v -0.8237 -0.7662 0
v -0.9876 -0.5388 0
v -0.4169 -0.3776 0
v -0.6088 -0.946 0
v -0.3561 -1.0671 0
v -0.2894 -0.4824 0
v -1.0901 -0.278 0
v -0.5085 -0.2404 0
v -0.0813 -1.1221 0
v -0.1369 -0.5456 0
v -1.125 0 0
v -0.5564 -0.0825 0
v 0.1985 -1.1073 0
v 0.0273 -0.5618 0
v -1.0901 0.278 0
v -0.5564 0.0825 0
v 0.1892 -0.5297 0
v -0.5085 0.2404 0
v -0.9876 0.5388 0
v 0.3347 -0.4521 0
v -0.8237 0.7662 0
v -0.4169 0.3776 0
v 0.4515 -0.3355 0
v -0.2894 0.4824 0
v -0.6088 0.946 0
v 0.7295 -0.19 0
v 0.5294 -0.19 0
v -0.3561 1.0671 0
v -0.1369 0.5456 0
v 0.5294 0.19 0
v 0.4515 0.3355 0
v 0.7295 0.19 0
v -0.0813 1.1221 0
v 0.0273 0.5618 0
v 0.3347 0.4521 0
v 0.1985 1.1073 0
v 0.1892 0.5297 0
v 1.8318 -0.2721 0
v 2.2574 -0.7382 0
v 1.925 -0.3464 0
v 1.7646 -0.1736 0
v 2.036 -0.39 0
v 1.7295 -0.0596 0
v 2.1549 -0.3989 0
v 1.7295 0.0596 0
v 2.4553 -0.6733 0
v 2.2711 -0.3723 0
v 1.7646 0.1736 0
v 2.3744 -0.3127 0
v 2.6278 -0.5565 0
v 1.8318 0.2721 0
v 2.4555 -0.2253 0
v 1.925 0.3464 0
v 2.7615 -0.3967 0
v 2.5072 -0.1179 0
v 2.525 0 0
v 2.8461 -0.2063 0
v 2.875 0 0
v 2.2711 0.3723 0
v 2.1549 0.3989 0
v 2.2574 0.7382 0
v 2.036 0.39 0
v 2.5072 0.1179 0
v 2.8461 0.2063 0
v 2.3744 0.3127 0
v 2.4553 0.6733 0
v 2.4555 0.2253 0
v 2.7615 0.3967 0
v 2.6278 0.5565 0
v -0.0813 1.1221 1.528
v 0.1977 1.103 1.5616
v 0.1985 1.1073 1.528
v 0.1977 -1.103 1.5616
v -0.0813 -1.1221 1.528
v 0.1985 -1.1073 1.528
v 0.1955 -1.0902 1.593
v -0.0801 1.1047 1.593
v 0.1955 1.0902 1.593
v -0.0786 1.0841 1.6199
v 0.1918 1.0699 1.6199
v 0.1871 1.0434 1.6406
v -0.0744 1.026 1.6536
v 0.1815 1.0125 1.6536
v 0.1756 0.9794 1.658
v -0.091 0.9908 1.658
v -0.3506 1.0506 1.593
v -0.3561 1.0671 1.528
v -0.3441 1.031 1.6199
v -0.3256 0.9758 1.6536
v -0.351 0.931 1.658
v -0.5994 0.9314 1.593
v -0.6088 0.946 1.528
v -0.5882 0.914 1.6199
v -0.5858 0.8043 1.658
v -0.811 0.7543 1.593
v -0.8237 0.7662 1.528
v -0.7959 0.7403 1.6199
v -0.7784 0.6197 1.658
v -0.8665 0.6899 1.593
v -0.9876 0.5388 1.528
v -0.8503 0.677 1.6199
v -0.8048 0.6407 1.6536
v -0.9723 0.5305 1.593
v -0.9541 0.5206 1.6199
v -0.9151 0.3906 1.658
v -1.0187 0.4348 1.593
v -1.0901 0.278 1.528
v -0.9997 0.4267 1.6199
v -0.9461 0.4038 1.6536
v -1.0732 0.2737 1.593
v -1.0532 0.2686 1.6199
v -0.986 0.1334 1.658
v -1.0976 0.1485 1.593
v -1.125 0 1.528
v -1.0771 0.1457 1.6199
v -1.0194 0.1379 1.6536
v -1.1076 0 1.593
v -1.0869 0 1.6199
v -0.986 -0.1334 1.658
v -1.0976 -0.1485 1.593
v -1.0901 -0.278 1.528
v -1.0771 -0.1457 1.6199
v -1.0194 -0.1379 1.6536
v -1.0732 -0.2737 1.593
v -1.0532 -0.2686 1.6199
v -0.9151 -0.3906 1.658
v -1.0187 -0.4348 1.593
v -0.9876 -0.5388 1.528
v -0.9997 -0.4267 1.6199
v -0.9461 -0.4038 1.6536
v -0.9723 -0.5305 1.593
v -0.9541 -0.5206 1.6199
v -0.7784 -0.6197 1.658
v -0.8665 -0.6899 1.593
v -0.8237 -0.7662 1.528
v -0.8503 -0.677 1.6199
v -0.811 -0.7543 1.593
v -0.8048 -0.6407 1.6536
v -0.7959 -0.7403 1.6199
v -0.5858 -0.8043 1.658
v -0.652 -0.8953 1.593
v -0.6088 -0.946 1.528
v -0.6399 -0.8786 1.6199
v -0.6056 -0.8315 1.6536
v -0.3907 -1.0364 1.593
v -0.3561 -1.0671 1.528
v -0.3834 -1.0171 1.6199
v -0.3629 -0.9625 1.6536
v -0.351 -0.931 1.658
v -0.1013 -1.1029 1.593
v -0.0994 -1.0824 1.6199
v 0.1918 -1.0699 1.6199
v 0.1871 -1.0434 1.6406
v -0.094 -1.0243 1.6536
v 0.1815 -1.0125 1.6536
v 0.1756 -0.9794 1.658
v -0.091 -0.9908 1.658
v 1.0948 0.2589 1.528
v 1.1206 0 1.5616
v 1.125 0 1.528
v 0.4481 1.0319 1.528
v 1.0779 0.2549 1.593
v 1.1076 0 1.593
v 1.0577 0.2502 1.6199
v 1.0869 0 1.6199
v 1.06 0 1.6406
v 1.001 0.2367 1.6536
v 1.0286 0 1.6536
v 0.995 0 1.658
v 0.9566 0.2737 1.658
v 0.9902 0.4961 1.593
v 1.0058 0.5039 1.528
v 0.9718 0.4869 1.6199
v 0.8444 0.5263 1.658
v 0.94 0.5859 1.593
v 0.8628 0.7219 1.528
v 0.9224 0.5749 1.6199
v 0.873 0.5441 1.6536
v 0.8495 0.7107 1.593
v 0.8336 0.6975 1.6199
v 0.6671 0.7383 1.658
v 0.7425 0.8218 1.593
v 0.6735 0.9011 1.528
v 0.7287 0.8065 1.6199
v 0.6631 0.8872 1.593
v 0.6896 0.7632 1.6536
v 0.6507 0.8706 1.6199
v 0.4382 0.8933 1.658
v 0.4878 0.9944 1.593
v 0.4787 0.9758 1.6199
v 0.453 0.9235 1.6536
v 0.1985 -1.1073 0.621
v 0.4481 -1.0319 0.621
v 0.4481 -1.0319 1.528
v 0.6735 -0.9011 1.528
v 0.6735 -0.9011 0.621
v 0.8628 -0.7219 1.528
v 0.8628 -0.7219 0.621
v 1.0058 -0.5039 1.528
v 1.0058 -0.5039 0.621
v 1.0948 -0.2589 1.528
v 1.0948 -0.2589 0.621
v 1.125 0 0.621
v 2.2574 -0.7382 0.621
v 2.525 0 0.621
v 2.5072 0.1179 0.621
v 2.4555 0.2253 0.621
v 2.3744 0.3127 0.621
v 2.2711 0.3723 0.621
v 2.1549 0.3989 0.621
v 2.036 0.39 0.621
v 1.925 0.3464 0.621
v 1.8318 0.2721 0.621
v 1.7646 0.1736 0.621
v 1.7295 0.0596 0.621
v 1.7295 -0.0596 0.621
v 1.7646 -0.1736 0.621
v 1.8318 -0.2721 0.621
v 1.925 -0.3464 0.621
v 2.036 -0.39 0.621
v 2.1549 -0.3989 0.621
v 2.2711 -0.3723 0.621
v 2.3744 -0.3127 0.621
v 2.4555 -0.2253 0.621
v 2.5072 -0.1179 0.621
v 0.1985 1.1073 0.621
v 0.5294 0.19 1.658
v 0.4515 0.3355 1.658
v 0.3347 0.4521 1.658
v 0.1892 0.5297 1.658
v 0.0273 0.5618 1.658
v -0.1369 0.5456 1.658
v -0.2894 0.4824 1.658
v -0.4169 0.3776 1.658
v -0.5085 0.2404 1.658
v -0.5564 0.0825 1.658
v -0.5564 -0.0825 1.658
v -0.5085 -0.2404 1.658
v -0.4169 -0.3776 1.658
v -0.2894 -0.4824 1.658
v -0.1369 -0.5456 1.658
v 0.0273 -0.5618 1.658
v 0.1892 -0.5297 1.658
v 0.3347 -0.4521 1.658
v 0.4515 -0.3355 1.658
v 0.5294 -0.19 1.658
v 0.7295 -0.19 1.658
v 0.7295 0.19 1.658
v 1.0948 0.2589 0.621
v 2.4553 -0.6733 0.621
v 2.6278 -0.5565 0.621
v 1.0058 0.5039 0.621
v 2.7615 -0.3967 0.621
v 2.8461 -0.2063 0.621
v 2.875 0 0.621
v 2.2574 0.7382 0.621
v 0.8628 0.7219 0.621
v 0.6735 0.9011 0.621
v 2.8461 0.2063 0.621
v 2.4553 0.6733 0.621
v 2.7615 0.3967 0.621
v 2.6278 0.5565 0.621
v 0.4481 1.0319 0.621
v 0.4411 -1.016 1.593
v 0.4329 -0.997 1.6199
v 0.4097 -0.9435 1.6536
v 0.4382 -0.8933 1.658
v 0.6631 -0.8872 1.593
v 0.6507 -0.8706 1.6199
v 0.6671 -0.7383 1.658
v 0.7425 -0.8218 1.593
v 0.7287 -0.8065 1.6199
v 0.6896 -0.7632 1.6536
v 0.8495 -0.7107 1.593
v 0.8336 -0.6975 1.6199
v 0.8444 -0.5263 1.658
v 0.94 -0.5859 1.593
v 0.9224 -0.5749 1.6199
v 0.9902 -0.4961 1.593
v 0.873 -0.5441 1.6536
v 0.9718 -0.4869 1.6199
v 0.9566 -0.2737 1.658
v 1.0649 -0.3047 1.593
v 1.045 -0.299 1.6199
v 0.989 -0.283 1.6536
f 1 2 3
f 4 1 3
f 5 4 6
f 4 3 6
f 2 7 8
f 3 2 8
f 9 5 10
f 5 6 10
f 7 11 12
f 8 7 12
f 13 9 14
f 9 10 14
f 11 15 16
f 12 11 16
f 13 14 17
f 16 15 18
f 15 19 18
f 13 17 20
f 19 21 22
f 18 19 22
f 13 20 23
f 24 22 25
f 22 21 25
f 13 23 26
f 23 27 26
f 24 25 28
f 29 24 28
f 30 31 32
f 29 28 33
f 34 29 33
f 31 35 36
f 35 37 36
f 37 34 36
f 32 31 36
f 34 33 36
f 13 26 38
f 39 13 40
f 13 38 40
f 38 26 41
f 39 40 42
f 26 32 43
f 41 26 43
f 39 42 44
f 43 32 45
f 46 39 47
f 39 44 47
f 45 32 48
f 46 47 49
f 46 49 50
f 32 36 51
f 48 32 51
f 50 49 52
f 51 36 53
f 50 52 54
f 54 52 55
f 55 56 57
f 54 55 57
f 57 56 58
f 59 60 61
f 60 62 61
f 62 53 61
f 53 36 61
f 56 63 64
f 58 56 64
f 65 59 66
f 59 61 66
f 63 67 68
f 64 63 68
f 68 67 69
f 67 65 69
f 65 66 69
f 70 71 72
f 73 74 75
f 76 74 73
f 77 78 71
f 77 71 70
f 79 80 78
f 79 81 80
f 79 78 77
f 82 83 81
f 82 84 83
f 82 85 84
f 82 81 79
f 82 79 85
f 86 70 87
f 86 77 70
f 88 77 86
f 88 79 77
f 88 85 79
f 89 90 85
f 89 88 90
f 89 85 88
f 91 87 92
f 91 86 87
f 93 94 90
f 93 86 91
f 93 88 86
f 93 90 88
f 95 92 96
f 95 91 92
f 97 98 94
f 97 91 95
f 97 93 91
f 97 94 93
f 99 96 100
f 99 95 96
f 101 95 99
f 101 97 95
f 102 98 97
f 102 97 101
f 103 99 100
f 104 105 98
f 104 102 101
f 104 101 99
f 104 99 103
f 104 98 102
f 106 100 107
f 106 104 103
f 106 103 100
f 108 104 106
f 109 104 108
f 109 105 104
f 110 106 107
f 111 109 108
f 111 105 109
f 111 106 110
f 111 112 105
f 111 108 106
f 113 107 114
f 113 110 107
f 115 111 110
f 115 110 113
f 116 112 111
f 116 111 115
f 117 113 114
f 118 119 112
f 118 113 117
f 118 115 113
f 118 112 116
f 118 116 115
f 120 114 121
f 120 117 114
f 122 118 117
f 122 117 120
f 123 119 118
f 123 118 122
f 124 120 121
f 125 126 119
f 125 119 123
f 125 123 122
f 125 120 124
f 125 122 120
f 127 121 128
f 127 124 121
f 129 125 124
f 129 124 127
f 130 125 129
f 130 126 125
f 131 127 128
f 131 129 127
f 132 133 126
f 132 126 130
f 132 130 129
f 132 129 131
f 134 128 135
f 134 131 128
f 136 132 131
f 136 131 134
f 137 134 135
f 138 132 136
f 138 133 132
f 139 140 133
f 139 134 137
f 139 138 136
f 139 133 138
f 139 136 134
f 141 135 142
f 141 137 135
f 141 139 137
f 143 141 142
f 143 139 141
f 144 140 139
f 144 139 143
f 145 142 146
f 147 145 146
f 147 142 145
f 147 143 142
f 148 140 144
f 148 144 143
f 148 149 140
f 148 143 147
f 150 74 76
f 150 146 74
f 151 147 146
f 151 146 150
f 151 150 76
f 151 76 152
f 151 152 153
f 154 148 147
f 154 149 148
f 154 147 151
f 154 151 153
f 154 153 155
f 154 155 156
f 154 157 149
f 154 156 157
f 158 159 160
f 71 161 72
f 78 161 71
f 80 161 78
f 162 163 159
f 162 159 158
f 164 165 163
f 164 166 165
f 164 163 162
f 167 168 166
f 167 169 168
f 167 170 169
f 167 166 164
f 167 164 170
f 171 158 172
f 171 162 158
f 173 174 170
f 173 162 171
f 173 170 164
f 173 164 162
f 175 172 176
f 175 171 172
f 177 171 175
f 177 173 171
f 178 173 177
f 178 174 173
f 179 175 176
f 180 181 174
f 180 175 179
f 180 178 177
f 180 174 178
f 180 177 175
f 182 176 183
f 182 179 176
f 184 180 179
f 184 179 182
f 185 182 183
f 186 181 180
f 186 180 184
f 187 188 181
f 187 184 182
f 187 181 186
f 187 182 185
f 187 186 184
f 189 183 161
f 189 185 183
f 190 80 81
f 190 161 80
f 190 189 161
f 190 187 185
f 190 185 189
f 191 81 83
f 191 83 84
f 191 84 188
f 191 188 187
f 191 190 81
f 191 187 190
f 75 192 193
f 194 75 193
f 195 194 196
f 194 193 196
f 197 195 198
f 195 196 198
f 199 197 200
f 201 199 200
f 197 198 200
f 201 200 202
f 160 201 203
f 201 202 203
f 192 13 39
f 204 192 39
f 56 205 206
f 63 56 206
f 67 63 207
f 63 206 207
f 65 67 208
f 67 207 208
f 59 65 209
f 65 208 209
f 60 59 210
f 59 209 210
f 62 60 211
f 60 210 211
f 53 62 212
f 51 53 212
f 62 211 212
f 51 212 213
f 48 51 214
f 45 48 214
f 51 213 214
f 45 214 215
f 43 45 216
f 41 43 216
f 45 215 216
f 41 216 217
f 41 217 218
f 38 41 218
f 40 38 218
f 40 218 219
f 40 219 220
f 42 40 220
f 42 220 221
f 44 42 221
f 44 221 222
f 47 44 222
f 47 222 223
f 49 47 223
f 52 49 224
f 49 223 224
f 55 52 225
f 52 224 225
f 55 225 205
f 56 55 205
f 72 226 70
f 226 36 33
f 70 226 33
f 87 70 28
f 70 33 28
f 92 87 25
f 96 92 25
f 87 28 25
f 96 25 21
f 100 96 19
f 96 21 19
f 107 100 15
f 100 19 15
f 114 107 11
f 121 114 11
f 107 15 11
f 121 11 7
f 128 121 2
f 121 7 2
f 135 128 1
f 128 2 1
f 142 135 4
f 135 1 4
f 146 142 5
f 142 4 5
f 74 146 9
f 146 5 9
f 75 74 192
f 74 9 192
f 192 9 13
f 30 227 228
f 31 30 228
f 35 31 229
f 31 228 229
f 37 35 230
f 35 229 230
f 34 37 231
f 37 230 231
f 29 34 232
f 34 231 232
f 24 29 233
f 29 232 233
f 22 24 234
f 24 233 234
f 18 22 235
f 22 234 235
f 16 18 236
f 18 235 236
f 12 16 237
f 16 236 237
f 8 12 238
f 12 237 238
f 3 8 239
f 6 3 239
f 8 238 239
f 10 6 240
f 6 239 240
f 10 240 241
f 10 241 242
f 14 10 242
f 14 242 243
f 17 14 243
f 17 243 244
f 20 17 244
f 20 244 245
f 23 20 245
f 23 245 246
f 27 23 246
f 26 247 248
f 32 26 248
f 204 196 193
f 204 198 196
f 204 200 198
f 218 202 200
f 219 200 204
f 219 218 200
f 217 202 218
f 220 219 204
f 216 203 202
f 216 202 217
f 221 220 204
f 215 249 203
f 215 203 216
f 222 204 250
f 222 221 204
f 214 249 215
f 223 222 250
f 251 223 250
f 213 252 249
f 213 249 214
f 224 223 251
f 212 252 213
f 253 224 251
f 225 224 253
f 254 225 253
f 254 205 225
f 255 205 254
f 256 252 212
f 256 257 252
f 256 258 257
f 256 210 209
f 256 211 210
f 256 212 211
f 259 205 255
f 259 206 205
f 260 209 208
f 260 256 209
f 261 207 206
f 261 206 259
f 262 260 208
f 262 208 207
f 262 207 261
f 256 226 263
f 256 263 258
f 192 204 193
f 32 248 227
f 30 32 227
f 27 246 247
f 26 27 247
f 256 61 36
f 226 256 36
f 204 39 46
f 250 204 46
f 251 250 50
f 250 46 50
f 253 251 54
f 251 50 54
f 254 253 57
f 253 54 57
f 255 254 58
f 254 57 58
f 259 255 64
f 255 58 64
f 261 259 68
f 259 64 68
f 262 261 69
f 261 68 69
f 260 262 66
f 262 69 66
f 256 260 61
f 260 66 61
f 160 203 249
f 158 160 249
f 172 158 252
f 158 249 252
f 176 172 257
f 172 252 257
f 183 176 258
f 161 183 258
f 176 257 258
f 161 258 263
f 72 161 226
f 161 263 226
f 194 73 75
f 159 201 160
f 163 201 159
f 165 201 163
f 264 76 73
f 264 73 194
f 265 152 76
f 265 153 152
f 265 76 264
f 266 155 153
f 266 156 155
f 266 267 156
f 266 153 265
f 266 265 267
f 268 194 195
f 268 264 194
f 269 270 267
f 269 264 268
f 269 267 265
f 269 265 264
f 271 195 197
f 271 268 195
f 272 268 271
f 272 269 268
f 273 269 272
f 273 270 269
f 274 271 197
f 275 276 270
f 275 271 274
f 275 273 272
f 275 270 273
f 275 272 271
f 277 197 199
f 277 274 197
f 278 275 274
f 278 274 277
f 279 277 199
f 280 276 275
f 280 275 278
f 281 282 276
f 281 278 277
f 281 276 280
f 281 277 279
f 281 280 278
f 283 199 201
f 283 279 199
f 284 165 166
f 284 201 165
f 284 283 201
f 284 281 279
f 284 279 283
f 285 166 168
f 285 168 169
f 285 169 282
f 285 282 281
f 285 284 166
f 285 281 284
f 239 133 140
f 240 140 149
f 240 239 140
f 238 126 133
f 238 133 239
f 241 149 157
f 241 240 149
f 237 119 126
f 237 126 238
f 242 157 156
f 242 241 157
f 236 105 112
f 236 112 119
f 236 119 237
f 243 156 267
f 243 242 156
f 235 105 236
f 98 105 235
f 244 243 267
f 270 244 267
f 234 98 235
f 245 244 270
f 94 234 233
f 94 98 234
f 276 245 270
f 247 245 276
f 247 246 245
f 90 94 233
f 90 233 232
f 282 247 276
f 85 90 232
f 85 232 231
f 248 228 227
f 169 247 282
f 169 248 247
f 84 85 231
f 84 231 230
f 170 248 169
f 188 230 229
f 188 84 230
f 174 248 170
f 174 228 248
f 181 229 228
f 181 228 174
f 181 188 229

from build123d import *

# Parameters (mm, degrees)
F1_DEPTH = 0.621
F3_DEPTH = 1.037
F4_R     = 0.4
F5_DEPTH = 0.621
F7_DEPTH = 12.5
F8_R     = 0.13


with BuildPart() as f1:
    # F0 (on Top) → F1 (new body)
    with BuildSketch(Plane.XY):
        with BuildLine():
            Line((2.257353, 0.738229), (0.198529, 1.107344))
            ThreePointArc((0.198529, 1.107344), (-1.125, 0), (0.198529, -1.107344))
            Line((0.198529, -1.107344), (2.257353, -0.738229))
            ThreePointArc((2.257353, -0.738229), (2.875, 0), (2.257353, 0.738229))
        make_face()
    extrude(amount=F1_DEPTH)

    # F2 (on face) → F3 (join)
    with BuildSketch(Plane.XY.offset(0.621)):
        with BuildLine():
            ThreePointArc((0.198529, -1.107344), (0.862836, -0.7219), (1.125, 0))
            ThreePointArc((1.125, 0), (0.862836, 0.7219), (0.198529, 1.107344))
            ThreePointArc((0.198529, 1.107344), (-1.125, 0), (0.198529, -1.107344))
        make_face()
    extrude(amount=F3_DEPTH)

    # F4 (on face) → F5 (cut, through all)
    with BuildSketch(Plane.XY.offset(0.621)):
        with Locations((2.125, 0)):
            Circle(F4_R)
    extrude(amount=-F5_DEPTH, mode=Mode.SUBTRACT)

    # F6 (on face) → F7 (cut, symmetric)
    with BuildSketch(Plane.XY.offset(1.658)):
        with BuildLine():
            Line((0.7295, 0.19), (0.52944, 0.19))
            ThreePointArc((0.52944, 0.19), (-0.5625, 0), (0.52944, -0.19))
            Line((0.52944, -0.19), (0.7295, -0.19))
            Line((0.7295, -0.19), (0.7295, 0.19))
        make_face()
    extrude(amount=F7_DEPTH, both=True, mode=Mode.SUBTRACT)

    # F8
    f8_edges = [f1.edges().sort_by_distance(p)[0] for p in [
        (-0.198529, 1.107344, 1.658),
    ]]
    fillet(f8_edges, radius=F8_R)


solid = f1.part
